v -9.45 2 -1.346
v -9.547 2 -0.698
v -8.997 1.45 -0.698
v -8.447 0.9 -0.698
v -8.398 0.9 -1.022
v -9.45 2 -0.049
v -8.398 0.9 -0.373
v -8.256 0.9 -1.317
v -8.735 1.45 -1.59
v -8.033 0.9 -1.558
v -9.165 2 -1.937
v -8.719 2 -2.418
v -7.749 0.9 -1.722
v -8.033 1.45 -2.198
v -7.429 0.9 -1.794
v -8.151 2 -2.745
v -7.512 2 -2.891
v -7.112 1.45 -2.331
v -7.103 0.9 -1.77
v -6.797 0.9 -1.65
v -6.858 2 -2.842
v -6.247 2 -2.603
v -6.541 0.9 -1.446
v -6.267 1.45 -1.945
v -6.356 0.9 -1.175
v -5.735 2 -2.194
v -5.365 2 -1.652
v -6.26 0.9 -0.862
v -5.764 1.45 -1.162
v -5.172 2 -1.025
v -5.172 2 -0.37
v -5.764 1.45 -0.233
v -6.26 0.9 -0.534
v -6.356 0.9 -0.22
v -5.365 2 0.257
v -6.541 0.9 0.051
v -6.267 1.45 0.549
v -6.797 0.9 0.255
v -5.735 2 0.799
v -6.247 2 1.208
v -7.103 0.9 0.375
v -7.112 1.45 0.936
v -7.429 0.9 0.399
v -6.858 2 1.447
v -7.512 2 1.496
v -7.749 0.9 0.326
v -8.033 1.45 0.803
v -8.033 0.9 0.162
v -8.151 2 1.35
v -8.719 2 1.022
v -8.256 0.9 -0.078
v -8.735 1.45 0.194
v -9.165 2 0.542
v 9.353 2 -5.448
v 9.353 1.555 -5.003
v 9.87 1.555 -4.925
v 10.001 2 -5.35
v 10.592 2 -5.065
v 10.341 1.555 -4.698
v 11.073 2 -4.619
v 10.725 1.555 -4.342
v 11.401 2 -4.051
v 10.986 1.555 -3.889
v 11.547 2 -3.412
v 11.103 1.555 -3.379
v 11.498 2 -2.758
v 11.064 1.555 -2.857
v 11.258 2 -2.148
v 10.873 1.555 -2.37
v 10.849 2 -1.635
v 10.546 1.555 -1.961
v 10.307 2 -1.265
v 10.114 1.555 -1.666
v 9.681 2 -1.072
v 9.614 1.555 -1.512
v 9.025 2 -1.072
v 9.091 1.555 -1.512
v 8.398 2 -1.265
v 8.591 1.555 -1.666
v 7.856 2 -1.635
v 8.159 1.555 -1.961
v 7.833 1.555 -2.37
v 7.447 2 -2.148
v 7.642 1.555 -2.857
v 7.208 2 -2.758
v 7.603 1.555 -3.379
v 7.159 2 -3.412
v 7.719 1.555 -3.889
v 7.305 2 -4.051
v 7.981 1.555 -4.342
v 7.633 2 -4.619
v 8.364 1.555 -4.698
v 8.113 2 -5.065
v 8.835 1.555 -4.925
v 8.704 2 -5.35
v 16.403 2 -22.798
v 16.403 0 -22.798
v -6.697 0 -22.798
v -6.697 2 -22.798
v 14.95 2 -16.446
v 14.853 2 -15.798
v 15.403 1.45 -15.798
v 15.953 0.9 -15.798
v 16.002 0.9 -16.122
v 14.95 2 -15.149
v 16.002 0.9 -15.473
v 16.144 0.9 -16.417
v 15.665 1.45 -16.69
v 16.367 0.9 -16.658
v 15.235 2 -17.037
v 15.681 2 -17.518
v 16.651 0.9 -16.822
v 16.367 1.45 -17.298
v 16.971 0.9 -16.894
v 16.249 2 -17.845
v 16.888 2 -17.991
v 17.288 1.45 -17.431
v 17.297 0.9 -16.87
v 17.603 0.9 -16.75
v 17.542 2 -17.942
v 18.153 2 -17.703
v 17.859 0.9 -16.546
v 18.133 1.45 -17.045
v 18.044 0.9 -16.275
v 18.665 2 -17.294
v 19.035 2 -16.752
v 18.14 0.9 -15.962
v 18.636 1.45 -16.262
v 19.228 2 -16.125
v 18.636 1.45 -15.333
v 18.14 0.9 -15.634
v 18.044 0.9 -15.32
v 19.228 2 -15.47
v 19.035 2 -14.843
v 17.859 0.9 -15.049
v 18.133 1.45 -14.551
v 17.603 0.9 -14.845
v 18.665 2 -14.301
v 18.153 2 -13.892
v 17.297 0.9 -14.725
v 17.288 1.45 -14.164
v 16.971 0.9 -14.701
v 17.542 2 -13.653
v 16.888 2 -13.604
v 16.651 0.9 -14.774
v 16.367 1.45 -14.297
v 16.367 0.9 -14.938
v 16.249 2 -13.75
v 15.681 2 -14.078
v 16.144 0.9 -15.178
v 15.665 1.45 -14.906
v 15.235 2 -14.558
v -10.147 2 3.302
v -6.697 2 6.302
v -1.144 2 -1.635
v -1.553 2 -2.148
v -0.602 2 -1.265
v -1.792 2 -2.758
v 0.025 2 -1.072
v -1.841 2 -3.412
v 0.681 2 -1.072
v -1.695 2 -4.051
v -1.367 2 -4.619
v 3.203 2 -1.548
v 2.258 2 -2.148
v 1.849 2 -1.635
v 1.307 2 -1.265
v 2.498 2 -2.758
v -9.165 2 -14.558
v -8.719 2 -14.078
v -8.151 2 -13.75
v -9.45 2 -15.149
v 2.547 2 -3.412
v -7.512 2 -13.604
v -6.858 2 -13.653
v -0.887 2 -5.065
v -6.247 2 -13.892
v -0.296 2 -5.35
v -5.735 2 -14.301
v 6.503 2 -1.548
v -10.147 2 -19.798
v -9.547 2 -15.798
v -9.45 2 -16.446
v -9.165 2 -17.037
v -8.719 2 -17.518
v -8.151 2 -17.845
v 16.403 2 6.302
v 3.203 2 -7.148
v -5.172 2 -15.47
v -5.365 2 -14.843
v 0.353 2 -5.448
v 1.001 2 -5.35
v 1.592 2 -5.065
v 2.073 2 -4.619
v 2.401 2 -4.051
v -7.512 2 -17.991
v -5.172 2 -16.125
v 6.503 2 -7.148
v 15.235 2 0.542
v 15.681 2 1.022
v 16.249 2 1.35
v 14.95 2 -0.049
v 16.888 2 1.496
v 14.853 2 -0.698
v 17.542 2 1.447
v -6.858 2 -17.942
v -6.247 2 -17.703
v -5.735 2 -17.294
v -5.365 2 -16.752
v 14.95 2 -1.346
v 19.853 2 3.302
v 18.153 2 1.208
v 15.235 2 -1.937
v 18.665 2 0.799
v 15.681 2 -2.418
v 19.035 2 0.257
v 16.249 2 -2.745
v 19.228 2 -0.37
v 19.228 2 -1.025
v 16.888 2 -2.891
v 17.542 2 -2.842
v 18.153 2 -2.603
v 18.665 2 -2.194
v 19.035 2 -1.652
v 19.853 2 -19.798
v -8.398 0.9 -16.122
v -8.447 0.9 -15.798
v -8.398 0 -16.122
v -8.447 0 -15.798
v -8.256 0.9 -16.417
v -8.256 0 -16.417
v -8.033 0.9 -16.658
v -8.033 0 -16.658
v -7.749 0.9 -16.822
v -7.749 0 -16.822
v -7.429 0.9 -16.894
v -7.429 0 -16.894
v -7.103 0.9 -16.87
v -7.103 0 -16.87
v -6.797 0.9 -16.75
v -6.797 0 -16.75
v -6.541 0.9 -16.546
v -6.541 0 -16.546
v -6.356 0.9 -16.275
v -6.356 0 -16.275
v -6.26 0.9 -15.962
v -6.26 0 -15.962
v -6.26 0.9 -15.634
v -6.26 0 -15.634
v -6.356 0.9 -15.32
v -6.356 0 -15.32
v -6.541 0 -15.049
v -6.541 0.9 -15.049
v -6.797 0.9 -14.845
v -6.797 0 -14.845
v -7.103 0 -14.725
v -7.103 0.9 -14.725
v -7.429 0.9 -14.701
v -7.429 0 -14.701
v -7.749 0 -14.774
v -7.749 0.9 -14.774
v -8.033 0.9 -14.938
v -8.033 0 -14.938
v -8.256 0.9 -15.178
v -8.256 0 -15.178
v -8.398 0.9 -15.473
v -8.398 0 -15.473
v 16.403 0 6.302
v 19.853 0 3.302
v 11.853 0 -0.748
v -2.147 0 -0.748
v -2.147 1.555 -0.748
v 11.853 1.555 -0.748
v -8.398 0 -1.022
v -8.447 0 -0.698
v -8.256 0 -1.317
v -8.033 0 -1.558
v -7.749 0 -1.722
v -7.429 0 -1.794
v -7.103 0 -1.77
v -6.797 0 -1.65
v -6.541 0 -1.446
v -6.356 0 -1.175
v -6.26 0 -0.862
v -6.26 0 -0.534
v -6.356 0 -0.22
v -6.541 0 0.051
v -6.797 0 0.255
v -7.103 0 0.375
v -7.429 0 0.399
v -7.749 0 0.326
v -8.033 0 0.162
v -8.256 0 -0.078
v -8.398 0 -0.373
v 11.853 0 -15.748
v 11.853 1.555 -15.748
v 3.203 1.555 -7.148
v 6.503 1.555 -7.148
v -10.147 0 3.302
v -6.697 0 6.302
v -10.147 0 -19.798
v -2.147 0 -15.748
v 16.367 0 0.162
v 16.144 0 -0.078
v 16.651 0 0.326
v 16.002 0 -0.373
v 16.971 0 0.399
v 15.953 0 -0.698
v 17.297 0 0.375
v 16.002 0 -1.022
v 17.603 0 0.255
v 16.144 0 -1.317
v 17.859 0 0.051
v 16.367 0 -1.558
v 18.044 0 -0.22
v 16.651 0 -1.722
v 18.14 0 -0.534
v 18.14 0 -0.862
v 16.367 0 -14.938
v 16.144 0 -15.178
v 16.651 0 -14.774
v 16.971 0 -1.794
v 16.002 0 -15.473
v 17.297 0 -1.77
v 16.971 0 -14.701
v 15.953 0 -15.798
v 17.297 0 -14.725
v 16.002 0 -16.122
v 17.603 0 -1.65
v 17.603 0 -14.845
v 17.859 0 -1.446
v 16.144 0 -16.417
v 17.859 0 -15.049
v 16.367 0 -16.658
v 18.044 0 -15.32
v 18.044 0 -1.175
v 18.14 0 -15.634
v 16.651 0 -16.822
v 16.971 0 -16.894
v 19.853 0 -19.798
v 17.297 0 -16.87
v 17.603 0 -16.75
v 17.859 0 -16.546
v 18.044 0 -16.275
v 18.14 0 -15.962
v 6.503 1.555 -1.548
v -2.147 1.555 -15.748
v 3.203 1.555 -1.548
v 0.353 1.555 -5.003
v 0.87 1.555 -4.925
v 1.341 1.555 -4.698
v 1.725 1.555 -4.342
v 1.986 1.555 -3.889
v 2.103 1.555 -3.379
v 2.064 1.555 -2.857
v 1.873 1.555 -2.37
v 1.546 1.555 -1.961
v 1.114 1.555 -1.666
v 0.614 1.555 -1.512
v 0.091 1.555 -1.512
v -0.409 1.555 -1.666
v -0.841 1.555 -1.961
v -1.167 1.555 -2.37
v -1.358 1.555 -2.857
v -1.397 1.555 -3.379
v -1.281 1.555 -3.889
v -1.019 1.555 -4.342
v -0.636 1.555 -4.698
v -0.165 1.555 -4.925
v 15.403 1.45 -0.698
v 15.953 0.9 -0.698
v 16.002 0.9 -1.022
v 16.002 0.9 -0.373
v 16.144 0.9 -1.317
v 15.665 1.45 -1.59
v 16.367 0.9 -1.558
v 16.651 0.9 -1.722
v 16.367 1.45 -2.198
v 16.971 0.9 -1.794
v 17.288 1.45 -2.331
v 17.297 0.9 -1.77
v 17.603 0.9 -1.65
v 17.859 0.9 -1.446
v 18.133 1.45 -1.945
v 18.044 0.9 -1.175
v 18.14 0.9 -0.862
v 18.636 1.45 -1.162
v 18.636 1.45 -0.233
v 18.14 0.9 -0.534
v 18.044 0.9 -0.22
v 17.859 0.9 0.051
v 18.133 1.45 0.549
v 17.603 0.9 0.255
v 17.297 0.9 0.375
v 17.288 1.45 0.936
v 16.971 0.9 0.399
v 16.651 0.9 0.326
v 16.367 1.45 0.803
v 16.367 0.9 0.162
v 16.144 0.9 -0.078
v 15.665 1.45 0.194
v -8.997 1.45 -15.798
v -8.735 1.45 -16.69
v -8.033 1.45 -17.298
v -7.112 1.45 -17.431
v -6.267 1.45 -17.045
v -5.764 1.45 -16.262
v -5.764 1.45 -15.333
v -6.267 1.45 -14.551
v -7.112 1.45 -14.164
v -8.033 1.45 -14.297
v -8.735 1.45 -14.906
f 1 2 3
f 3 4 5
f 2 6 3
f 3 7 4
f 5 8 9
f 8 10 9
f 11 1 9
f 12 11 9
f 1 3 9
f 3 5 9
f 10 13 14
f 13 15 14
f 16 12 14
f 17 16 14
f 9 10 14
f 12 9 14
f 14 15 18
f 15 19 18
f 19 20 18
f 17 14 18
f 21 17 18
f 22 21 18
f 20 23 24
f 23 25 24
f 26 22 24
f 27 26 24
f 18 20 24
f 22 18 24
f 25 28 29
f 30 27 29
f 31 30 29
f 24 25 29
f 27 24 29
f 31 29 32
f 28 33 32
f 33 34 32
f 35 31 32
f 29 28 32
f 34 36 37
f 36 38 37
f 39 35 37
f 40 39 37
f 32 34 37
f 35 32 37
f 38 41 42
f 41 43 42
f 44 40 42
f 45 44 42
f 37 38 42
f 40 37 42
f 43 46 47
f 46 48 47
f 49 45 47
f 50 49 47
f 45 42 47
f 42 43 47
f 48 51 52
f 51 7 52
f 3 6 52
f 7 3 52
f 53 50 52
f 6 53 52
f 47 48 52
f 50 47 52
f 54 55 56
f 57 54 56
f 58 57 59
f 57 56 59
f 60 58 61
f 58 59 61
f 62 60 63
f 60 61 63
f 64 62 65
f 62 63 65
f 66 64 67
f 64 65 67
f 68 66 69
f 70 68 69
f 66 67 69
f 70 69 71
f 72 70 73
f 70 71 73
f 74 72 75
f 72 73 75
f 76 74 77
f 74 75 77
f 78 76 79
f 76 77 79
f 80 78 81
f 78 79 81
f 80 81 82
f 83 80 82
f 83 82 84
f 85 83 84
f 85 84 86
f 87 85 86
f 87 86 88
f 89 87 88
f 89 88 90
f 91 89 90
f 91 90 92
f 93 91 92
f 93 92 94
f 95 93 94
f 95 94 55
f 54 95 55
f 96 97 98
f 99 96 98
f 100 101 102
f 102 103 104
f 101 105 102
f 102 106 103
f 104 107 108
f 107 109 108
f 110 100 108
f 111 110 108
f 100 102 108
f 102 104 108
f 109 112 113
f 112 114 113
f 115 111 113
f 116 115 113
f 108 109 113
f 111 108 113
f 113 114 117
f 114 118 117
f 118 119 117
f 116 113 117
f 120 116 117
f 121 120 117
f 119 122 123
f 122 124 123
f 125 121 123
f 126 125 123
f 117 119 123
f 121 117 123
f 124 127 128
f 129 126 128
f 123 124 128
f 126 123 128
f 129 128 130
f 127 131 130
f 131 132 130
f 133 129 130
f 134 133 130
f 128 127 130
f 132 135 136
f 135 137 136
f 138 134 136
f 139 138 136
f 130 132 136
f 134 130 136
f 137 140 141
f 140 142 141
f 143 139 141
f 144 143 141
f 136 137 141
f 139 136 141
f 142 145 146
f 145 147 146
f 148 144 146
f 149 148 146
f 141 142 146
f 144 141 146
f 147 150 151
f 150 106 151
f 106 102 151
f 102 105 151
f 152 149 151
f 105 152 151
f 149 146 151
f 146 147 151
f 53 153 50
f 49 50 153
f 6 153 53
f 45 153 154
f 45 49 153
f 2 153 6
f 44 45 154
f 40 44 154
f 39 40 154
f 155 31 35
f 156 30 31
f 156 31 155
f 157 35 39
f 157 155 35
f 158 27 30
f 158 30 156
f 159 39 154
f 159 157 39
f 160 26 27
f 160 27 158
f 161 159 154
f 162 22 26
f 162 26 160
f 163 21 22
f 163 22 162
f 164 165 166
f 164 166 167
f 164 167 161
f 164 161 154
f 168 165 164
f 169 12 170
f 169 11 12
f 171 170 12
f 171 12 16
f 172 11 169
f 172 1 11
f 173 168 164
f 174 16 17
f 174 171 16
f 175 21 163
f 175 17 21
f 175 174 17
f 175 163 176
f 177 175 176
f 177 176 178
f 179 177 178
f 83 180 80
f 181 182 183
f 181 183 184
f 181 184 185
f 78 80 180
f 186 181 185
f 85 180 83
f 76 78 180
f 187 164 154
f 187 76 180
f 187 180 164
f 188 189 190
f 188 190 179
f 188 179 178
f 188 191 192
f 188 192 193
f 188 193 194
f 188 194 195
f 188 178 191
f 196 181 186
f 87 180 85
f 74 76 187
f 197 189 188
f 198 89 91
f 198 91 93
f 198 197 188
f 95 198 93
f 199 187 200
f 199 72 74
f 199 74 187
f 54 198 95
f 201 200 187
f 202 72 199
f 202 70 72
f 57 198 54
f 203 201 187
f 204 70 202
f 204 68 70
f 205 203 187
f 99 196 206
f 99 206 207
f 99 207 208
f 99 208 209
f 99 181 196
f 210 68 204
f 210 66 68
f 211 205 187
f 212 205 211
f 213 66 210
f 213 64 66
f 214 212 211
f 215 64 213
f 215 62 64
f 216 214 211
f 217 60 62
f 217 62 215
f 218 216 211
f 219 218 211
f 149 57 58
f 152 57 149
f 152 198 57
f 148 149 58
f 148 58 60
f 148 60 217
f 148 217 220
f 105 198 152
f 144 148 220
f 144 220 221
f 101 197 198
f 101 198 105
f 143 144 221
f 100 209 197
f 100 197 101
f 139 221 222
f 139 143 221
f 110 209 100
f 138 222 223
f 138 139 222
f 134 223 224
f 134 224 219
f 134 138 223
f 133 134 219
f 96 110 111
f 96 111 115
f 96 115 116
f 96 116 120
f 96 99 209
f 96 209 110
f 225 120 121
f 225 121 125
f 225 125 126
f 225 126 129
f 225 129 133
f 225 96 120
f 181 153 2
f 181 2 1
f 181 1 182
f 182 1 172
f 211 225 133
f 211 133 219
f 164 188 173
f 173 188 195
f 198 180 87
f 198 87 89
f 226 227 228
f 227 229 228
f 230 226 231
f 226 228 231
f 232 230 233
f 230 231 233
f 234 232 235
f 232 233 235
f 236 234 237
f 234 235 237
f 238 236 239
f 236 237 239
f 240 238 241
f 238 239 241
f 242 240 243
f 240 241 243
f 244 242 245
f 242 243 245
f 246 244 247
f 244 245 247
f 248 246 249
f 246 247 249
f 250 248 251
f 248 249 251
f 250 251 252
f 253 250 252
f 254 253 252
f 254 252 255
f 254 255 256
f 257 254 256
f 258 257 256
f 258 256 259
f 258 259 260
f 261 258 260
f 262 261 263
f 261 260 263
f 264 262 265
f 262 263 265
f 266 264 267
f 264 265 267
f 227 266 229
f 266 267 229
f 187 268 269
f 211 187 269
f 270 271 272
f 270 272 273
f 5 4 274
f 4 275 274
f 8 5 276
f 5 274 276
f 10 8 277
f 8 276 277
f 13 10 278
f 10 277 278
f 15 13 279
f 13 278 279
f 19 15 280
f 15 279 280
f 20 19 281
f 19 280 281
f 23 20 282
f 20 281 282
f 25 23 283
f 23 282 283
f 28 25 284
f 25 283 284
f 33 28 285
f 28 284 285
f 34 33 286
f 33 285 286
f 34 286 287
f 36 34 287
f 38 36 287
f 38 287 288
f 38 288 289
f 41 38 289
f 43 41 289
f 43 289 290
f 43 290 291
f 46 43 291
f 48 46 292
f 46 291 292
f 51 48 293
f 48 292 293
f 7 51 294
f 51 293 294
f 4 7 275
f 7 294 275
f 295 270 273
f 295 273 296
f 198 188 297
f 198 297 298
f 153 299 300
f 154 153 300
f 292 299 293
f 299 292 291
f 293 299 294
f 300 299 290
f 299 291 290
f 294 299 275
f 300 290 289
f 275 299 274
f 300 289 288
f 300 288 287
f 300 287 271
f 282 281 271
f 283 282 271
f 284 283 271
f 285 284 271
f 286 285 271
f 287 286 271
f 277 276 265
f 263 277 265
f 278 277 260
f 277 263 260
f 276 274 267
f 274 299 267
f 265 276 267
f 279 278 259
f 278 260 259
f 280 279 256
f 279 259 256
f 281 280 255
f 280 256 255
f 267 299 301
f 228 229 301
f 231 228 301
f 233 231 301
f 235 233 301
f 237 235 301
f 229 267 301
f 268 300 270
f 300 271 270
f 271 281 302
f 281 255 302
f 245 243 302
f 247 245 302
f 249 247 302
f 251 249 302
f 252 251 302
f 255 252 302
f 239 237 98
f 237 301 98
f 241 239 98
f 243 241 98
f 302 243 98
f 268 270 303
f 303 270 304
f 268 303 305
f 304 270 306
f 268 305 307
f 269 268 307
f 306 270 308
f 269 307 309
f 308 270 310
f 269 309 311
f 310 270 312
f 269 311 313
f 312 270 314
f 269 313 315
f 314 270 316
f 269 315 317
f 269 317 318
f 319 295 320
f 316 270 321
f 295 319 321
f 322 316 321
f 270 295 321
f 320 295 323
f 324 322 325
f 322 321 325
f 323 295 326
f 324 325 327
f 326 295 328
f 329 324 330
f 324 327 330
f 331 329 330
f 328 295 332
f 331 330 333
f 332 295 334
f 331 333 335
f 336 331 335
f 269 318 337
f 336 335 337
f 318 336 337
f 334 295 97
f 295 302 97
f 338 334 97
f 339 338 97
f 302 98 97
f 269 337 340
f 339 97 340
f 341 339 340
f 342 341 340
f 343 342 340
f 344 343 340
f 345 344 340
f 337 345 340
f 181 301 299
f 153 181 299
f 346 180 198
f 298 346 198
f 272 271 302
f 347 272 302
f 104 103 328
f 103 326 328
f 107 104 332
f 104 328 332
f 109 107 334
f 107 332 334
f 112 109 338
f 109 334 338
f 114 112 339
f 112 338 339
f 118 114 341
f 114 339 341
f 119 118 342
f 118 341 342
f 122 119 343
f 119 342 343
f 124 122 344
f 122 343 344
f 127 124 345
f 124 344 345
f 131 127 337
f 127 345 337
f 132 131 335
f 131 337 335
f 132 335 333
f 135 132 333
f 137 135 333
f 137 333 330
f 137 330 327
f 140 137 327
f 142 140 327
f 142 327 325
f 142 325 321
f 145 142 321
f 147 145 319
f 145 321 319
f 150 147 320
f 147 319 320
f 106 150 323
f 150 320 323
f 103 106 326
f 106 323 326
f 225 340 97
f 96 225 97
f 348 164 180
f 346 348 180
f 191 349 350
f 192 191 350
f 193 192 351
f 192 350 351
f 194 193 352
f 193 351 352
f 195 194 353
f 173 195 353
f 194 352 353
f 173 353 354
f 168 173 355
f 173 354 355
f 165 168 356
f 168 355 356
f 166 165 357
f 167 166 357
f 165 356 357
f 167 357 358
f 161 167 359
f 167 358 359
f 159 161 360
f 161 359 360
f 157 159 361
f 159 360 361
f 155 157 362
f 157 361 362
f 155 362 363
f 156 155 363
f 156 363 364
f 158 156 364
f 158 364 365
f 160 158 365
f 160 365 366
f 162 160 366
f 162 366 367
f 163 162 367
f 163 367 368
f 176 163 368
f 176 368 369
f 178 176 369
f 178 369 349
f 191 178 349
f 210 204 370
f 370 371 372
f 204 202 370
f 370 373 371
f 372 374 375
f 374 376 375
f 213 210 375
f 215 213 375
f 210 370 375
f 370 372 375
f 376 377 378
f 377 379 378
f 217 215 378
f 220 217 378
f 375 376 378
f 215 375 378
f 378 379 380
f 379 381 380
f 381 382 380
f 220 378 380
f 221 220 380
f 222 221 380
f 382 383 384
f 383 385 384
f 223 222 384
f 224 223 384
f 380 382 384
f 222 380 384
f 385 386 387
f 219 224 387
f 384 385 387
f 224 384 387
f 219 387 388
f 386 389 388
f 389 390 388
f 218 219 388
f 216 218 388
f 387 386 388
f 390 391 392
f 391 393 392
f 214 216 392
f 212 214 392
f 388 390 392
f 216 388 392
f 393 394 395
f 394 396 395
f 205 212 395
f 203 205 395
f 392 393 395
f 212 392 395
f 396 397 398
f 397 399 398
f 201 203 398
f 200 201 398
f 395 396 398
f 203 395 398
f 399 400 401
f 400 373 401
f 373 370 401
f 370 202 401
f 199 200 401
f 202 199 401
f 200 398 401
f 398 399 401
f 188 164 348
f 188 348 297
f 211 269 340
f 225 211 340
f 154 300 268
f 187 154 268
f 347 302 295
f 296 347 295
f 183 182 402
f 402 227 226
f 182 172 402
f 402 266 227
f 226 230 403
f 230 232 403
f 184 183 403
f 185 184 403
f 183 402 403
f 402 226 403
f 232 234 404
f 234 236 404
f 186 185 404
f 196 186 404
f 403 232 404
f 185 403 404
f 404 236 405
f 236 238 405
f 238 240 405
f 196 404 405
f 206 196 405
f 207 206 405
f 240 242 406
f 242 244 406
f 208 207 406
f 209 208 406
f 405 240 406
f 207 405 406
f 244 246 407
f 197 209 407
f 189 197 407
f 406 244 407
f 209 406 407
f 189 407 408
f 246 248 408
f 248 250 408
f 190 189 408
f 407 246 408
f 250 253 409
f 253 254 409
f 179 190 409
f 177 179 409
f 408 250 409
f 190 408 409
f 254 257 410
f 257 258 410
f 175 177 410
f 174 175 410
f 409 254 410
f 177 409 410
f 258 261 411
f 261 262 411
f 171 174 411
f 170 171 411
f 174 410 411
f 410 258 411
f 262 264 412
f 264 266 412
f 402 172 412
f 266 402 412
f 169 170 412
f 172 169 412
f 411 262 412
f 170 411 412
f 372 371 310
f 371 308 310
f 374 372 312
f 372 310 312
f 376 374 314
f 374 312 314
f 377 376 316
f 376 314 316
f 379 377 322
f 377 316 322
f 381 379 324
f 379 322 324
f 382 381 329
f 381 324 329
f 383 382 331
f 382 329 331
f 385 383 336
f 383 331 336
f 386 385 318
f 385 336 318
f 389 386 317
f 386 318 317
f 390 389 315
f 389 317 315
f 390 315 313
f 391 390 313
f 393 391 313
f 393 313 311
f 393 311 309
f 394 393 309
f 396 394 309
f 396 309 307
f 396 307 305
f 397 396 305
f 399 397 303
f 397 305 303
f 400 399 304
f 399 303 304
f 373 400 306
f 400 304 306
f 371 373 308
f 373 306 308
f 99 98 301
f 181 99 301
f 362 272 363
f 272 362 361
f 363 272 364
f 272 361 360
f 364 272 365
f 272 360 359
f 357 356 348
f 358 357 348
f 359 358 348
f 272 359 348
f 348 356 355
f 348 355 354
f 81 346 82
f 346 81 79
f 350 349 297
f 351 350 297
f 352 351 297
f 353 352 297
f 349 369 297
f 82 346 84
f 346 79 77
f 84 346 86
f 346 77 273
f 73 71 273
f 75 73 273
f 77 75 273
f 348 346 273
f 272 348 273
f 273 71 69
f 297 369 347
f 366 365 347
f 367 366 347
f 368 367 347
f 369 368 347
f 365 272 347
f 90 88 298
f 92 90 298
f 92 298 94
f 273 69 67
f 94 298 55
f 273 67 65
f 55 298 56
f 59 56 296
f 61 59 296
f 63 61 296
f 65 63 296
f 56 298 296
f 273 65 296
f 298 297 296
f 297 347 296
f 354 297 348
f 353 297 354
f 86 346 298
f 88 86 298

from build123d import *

# Parameters (mm, degrees)
BOSS_EXTRUDE1_DEPTH                             = 2
CSK_FOR_M2_FLAT_HEAD_MACHINE_SCREW1_D           = 2.2
CSK_FOR_M2_FLAT_HEAD_MACHINE_SCREW1_DEPTH       = 4
CSK_FOR_M2_FLAT_HEAD_MACHINE_SCREW1_CSINK_D     = 4.4
CSK_FOR_M2_FLAT_HEAD_MACHINE_SCREW1_CSINK_ANGLE = 90
CSK_FOR_M2_FLAT_HEAD_MACHINE_SCREW1_TIP         = 0.660946681
SKETCH9_W                                       = 14
SKETCH9_H                                       = 15
CUT_EXTRUDE4_DEPTH                              = 1.555
SKETCH10_R                                      = 0.5
CUT_EXTRUDE5_DEPTH                              = 1.555
CSK_FOR_M2_FLAT_HEAD_MACHINE_SCREW2_D           = 2.4
CSK_FOR_M2_FLAT_HEAD_MACHINE_SCREW2_DEPTH       = 4
CSK_FOR_M2_FLAT_HEAD_MACHINE_SCREW2_CSINK_D     = 4.4
CSK_FOR_M2_FLAT_HEAD_MACHINE_SCREW2_CSINK_ANGLE = 90
CSK_FOR_M2_FLAT_HEAD_MACHINE_SCREW2_TIP         = 0.721032743
SKETCH12_W                                      = 3.3
SKETCH12_H                                      = 5.6
CUT_EXTRUDE6_DEPTH                              = 31.296192101


with BuildPart() as part:
    # Sketch1 → Boss-Extrude1 (new body)
    with BuildSketch(Plane(origin=(0, 0, 0), x_dir=(1, 0, 0), z_dir=(0, 1, 0))):
        Polygon((-10.147286186, 19.79756588), (-10.147286186, -3.30243412), (-6.697286186, -6.30243412), (16.402713814, -6.30243412), (19.852713814, -3.30243412), (19.852713814, 19.79756588), (16.402713814, 22.79756588), (-6.697286186, 22.79756588), align=None)
    extrude(amount=BOSS_EXTRUDE1_DEPTH)

    # CSK for M2 Flat Head Machine Screw1
    with Locations(Plane(origin=(0, 2, 0), x_dir=(1, 0, 0), z_dir=(0, 1, 0))):
        with Locations((-7.347286186, 15.79756588), (17.052713814, 15.79756588), (17.052713814, 0.69756588), (-7.347286186, 0.69756588)):
            CounterSinkHole(CSK_FOR_M2_FLAT_HEAD_MACHINE_SCREW1_D / 2, CSK_FOR_M2_FLAT_HEAD_MACHINE_SCREW1_CSINK_D / 2, depth=CSK_FOR_M2_FLAT_HEAD_MACHINE_SCREW1_DEPTH, counter_sink_angle=CSK_FOR_M2_FLAT_HEAD_MACHINE_SCREW1_CSINK_ANGLE)
            with Locations((0, 0, -(CSK_FOR_M2_FLAT_HEAD_MACHINE_SCREW1_DEPTH + CSK_FOR_M2_FLAT_HEAD_MACHINE_SCREW1_TIP / 2))):  # 118° drill point
                Cone(0, CSK_FOR_M2_FLAT_HEAD_MACHINE_SCREW1_D / 2, CSK_FOR_M2_FLAT_HEAD_MACHINE_SCREW1_TIP, mode=Mode.SUBTRACT)

    # Sketch9 → Cut-Extrude4 (cut)
    with BuildSketch(Plane(origin=(0, 0, 0), x_dir=(1, 0, 0), z_dir=(0, 1, 0))):
        with Locations((4.852713814, 8.24756588)):
            Rectangle(SKETCH9_W, SKETCH9_H)
    extrude(amount=CUT_EXTRUDE4_DEPTH, mode=Mode.SUBTRACT)

    # Sketch10 → Cut-Extrude5 (cut)
    with BuildSketch(Plane.XZ.offset(-1.555)):
        with Locations((0.352713814, -3.24756588)):
            Circle(SKETCH10_R)
        with Locations((9.352713814, -3.24756588)):
            Circle(SKETCH10_R)
    extrude(amount=-CUT_EXTRUDE5_DEPTH, mode=Mode.SUBTRACT)

    # CSK for M2 Flat Head Machine Screw2
    with Locations(Plane(origin=(9.352713814, 2, -3.24756588), x_dir=(0, 0, 1), z_dir=(0, 1, 0))):
        with Locations((0, 0), (0, -9)):
            CounterSinkHole(CSK_FOR_M2_FLAT_HEAD_MACHINE_SCREW2_D / 2, CSK_FOR_M2_FLAT_HEAD_MACHINE_SCREW2_CSINK_D / 2, depth=CSK_FOR_M2_FLAT_HEAD_MACHINE_SCREW2_DEPTH, counter_sink_angle=CSK_FOR_M2_FLAT_HEAD_MACHINE_SCREW2_CSINK_ANGLE)
            with Locations((0, 0, -(CSK_FOR_M2_FLAT_HEAD_MACHINE_SCREW2_DEPTH + CSK_FOR_M2_FLAT_HEAD_MACHINE_SCREW2_TIP / 2))):  # 118° drill point
                Cone(0, CSK_FOR_M2_FLAT_HEAD_MACHINE_SCREW2_D / 2, CSK_FOR_M2_FLAT_HEAD_MACHINE_SCREW2_TIP, mode=Mode.SUBTRACT)

    # Sketch12 → Cut-Extrude6 (cut, through all)
    with BuildSketch(Plane(origin=(0, 2, 0), x_dir=(1, 0, 0), z_dir=(0, 1, 0))):
        with Locations((4.852713814, 4.34756588)):
            Rectangle(SKETCH12_W, SKETCH12_H)
    extrude(amount=-CUT_EXTRUDE6_DEPTH, mode=Mode.SUBTRACT)


solid = part.part
